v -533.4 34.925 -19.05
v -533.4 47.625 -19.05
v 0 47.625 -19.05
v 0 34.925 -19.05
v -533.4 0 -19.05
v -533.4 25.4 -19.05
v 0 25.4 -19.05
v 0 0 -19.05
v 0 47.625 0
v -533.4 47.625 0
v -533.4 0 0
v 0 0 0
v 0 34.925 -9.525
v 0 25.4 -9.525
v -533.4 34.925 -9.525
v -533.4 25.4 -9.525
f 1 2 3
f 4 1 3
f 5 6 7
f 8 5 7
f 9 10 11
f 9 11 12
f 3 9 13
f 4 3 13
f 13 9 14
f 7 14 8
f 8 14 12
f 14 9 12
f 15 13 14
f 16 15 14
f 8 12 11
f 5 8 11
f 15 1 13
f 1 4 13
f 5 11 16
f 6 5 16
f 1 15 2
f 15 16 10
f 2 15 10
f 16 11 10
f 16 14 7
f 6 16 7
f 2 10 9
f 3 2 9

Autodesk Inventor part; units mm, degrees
ref_plane "YZ Plane" through (0, 0, 0) normal (1, 0, 0) x (0, 1, 0)
ref_plane "XZ Plane" through (0, 0, 0) normal (0, 1, 0) x (-1, 0, 0)
ref_plane "XY Plane" through (0, 0, 0) normal (0, 0, 1) x (1, 0, 0)
sketch "Sketch1" plane through (0, 0, 0) normal (0, 0, 1) x (1, 0, 0)
  line L0 (0, 0) -> (-533.4, 0)
  line L1 (-533.4, 0) -> (-533.4, 47.625)
  line L2 (-533.4, 47.625) -> (0, 47.625)
  line L3 (0, 47.625) -> (0, 0)
  dimension "d0" = 533.4
  dimension "d1" = 47.625
  dimension "d2" = 0
  dimension "d3" = 0
extrude "Extrusion1" add sketch "Sketch1" against normal blind 19.05
sketch "Sketch2" plane through (0, 0, 0) normal (1, 0, 0) x (0, 0, -1)
  line L0 (0, 0) -> (19.05, 0) projected
  line L1 (0, 47.625) -> (19.05, 47.625)
  line L2 (19.05, 47.625) -> (19.05, 0)
  line L3 (19.05, 0) -> (0, 0)
  line L4 (0, 0) -> (0, 47.625)
  line L5 (19.05, 34.925) -> (9.525, 34.925)
  line L6 (9.525, 34.925) -> (9.525, 25.4)
  line L7 (9.525, 25.4) -> (19.05, 25.4)
  line L8 (19.05, 25.4) -> (19.05, 34.925)
  dimension "d6" = 12.7
  dimension "d7" = 9.525
  dimension "d8" = 25.4
  dimension "d11" = 9.525
extrude "Extrusion2" cut sketch "Sketch2" against normal through all contours L7 L6 L5 L2
properties part number "bottom_board_side_slat" material "Wood (Birch)"
